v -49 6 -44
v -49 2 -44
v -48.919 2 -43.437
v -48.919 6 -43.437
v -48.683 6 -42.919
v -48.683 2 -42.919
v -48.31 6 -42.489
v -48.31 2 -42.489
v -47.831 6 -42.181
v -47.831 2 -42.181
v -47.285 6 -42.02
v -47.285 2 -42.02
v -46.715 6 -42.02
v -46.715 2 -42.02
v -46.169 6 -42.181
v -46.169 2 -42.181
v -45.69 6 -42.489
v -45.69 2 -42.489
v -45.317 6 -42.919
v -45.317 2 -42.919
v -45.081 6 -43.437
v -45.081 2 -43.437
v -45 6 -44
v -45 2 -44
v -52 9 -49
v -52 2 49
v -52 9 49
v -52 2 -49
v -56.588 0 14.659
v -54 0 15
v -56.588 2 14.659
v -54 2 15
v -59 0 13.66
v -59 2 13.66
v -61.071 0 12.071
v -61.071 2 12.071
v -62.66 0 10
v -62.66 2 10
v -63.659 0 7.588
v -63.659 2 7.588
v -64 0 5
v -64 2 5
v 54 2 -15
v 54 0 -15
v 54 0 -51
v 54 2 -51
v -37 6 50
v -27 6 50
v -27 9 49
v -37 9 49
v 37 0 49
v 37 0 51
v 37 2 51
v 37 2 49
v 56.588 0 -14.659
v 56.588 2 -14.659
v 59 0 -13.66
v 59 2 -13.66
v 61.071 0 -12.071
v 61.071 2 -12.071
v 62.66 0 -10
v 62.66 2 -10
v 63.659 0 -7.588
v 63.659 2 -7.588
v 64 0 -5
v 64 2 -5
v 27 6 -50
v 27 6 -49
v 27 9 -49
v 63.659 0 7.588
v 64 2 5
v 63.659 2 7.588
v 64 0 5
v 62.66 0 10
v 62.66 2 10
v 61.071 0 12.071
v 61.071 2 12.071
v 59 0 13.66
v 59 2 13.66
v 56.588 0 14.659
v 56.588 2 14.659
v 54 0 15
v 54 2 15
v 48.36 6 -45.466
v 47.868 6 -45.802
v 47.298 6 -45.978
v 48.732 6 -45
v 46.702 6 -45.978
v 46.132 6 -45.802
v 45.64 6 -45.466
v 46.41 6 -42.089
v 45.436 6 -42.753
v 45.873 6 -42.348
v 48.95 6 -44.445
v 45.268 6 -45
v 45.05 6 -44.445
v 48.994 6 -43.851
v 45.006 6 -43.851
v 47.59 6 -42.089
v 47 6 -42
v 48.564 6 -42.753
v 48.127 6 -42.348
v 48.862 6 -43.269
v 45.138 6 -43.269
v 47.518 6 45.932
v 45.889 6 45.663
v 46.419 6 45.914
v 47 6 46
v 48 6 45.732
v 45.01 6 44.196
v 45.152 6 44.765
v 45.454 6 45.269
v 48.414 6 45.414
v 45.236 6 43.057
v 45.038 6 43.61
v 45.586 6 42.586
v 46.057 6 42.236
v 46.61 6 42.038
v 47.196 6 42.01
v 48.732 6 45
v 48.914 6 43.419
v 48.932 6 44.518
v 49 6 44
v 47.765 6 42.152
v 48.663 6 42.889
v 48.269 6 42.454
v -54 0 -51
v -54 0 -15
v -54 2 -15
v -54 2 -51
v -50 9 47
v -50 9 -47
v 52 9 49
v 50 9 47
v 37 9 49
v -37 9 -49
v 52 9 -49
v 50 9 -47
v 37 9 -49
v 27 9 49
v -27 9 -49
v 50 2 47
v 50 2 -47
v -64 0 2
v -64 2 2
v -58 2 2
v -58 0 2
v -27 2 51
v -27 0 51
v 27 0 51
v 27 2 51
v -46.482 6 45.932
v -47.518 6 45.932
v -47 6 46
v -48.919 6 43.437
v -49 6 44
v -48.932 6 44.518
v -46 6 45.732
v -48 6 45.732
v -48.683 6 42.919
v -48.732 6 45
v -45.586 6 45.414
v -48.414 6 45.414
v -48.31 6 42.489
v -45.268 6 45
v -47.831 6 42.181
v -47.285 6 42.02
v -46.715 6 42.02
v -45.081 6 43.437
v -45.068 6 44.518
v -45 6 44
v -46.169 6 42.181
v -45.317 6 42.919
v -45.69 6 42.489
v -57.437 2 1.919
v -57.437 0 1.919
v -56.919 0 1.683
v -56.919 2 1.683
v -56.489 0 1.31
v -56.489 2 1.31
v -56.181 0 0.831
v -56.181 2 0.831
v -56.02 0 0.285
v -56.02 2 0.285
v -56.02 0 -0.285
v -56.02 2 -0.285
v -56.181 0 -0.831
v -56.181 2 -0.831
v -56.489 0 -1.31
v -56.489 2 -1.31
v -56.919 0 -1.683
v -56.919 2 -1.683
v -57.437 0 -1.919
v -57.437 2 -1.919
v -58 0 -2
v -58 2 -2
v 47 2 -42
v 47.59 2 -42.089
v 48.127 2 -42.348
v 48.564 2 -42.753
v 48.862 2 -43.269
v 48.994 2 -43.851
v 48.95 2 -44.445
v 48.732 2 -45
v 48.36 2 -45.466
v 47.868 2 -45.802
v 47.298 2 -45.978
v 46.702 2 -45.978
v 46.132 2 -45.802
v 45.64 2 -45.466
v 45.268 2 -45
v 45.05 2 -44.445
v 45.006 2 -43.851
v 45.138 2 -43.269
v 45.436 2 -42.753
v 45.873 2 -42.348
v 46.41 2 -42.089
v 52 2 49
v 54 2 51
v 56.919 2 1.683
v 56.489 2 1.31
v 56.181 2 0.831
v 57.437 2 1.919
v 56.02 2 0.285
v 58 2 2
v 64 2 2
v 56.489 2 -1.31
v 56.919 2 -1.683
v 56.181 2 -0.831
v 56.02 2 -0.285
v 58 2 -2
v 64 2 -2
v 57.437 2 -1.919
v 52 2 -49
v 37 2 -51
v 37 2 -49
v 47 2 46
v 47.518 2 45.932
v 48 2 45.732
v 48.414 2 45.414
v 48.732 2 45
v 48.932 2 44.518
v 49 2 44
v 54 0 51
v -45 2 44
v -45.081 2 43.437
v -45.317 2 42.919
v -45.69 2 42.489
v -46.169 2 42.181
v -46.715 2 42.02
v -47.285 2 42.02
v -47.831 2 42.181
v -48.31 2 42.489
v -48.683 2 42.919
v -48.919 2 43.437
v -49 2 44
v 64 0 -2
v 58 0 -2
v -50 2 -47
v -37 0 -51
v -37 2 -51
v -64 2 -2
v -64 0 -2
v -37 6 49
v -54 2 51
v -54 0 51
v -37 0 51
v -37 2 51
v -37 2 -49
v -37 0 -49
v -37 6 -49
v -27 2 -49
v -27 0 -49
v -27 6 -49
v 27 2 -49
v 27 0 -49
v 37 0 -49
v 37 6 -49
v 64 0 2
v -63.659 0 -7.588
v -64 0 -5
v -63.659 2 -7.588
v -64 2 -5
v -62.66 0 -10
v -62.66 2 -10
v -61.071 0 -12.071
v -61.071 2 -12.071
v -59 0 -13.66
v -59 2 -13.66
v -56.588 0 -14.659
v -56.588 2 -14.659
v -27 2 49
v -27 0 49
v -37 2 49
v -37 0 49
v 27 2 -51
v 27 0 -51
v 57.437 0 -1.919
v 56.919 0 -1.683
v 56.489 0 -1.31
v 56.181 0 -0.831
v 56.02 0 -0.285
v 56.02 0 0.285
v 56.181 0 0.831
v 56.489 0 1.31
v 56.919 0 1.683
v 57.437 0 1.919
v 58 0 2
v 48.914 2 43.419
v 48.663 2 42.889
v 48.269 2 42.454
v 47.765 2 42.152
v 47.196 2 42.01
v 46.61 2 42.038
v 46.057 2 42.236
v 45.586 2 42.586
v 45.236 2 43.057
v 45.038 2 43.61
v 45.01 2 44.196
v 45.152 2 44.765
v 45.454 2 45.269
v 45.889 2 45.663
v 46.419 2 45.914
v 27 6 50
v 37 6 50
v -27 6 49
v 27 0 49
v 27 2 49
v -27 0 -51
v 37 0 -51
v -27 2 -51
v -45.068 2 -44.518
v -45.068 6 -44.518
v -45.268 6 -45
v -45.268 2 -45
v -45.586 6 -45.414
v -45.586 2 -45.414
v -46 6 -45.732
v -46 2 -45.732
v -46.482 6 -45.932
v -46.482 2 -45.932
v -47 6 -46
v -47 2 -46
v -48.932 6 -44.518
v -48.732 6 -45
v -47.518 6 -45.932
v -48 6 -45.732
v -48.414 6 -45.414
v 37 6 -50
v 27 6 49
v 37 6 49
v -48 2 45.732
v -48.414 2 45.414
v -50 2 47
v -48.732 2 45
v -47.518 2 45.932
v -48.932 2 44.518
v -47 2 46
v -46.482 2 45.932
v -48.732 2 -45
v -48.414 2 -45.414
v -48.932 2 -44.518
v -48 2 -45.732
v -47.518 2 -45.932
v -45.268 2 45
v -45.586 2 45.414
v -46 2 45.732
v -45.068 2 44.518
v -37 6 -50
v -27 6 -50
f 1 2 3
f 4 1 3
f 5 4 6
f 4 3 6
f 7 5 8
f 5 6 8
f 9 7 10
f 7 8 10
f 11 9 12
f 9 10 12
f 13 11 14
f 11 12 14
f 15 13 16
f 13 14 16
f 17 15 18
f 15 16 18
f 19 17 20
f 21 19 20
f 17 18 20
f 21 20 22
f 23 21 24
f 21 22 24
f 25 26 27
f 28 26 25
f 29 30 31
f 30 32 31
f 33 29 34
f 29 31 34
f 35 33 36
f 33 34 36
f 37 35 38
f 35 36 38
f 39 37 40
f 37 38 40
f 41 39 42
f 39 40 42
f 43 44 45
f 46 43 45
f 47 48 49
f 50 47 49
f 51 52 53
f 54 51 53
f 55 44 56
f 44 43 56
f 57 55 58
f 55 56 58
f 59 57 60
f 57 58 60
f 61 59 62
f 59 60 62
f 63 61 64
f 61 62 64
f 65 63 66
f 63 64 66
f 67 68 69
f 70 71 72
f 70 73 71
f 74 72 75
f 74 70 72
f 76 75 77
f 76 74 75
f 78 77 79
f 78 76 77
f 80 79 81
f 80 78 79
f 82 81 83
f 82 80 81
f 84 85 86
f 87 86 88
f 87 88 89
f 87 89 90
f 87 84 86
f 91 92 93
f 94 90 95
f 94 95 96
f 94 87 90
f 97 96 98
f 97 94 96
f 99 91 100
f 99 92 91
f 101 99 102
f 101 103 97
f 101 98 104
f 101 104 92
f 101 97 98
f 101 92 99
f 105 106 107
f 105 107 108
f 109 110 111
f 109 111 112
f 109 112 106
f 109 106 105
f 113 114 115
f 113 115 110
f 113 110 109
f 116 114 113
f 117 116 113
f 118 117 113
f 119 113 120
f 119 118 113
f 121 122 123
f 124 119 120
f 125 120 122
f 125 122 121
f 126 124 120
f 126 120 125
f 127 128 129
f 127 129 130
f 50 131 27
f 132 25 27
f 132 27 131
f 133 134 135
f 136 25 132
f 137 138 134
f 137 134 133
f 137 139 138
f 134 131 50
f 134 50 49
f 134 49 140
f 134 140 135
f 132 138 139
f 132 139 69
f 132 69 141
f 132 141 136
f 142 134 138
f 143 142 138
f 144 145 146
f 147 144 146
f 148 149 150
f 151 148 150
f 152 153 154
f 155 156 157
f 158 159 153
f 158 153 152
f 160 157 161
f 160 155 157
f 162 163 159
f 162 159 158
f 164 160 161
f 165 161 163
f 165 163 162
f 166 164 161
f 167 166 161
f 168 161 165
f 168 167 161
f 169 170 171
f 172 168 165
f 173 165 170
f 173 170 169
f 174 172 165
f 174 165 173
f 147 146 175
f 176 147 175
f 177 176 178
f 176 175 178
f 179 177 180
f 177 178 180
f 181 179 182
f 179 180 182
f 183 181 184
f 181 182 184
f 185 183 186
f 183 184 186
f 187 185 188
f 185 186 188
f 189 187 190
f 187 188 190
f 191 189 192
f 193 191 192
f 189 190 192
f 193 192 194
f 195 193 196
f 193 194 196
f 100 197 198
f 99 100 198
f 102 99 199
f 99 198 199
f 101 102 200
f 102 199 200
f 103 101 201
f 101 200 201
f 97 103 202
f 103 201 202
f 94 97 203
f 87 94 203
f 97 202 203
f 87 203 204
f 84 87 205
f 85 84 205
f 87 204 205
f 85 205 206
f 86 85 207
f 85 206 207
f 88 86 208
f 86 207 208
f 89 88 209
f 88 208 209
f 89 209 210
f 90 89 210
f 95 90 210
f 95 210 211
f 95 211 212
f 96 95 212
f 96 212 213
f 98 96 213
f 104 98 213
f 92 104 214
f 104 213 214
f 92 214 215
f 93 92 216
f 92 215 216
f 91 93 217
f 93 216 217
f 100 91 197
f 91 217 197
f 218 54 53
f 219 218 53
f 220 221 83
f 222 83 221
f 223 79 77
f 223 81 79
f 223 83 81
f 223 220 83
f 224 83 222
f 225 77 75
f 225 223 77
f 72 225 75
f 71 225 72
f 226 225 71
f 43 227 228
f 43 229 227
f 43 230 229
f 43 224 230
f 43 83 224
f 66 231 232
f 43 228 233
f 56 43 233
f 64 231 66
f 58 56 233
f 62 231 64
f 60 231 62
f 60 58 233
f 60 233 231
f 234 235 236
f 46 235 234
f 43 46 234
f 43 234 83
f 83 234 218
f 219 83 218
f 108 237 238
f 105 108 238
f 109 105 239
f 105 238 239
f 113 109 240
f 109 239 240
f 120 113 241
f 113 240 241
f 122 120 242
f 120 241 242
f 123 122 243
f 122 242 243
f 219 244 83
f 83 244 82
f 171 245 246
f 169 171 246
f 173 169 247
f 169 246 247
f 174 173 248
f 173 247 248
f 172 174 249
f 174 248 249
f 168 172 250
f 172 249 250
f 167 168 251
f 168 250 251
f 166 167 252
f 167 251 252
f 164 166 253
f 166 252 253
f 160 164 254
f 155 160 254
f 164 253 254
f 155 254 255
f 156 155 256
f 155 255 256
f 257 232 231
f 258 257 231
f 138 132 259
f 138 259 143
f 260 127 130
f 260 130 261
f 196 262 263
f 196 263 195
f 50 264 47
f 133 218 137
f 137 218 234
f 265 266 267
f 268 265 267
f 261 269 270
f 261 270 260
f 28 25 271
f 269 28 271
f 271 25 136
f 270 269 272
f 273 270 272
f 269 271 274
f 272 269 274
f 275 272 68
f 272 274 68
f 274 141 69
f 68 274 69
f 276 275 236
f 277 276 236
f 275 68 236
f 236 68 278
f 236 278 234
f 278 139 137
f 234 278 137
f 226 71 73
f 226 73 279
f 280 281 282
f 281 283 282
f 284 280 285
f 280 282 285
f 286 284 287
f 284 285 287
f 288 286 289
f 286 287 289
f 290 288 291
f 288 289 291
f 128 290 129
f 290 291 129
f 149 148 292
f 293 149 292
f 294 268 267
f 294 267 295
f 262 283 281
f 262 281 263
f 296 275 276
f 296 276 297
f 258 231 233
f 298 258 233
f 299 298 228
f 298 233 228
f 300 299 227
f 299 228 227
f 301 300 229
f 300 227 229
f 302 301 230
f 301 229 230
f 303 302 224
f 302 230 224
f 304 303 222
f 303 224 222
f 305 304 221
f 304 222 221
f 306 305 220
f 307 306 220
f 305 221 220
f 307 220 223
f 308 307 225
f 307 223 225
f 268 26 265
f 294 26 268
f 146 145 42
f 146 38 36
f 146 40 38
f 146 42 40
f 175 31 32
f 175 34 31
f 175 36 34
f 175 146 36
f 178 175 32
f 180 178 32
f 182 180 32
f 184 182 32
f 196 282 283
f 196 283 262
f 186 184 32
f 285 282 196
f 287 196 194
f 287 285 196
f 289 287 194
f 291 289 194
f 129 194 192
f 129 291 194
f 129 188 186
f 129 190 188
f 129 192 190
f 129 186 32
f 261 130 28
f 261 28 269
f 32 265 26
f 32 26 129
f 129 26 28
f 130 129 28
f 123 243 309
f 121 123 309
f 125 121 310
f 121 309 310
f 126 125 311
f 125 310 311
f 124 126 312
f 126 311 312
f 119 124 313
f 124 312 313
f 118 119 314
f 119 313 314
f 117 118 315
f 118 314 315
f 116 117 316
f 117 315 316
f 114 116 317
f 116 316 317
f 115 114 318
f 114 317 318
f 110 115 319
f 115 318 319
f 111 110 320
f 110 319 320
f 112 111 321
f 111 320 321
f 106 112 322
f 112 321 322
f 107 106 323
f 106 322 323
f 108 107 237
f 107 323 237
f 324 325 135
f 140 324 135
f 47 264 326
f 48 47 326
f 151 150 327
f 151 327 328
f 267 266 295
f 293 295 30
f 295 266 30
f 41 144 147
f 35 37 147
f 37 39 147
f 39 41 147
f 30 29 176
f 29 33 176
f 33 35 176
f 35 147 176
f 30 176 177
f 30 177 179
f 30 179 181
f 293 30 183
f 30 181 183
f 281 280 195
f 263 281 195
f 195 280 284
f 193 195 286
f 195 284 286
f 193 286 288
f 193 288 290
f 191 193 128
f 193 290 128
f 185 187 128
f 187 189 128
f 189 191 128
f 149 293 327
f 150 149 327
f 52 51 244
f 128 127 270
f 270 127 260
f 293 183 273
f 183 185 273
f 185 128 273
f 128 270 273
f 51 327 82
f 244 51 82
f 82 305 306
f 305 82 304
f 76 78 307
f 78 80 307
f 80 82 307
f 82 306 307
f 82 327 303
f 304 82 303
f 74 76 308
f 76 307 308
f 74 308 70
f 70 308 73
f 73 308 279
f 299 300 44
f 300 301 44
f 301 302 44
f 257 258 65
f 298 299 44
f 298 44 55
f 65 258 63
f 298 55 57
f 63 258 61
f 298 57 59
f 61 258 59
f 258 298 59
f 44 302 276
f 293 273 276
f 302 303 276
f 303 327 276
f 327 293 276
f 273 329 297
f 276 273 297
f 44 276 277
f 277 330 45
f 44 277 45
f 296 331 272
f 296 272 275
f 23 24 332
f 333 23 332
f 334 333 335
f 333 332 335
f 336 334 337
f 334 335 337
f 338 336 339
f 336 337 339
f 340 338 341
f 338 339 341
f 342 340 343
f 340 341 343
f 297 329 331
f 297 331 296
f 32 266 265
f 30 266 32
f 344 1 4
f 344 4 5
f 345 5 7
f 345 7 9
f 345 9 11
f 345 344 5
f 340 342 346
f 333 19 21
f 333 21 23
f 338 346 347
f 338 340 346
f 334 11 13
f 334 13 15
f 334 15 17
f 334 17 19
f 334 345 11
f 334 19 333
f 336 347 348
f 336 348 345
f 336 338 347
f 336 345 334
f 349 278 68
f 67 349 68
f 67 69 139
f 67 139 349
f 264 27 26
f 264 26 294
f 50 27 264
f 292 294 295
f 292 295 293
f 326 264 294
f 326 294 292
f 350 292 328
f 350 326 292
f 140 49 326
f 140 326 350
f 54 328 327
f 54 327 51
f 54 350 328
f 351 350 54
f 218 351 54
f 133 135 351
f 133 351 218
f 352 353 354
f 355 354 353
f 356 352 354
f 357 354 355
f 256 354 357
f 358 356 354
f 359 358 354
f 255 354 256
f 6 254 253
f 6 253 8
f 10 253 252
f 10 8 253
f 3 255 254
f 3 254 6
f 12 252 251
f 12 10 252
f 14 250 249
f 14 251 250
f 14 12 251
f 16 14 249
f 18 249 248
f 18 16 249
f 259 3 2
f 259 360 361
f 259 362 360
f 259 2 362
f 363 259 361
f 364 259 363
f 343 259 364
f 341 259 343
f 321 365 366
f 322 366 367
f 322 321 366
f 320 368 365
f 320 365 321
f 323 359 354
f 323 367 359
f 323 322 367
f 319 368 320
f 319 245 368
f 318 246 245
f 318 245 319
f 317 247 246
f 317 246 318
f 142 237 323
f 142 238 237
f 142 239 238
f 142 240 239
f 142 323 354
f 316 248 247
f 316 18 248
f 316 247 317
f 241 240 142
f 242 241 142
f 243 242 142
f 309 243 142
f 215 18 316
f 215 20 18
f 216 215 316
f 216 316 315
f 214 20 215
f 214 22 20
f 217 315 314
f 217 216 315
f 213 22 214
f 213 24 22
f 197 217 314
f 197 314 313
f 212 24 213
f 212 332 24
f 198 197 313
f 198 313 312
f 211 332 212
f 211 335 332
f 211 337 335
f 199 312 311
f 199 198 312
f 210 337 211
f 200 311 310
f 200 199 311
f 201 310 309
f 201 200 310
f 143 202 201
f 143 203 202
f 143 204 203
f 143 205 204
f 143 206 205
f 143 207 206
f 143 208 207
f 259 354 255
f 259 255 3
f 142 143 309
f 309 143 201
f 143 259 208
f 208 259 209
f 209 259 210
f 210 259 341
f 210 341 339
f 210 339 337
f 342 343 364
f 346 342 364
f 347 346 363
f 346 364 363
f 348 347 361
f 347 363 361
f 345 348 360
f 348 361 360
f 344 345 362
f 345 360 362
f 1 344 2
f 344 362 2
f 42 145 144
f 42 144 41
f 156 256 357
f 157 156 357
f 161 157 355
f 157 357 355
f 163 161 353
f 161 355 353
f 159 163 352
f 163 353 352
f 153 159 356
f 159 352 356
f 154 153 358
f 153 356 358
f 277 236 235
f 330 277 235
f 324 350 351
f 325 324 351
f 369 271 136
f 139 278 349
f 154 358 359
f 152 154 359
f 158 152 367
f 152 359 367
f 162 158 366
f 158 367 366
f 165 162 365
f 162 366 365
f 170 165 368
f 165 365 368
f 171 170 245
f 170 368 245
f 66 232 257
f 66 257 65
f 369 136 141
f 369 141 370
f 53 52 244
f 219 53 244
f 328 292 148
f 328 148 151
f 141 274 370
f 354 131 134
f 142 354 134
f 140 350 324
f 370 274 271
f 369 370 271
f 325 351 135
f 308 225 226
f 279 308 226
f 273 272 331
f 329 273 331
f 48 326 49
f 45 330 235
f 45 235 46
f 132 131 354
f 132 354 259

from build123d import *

# Parameters (mm, degrees)
SKETCH1_W            = 108
SKETCH1_H            = 102
BOSS_EXTRUDE1_DEPTH  = 2
SKETCH2_W            = 104
SKETCH2_H            = 98
BOSS_EXTRUDE2_DEPTH  = 7
SKETCH3_W            = 100
SKETCH3_H            = 94
CUT_EXTRUDE1_DEPTH   = 7
SKETCH4_W            = 10
SKETCH4_H            = 3
BOSS_EXTRUDE6_DEPTH  = 1
CUT_EXTRUDE2_DEPTH   = 10
SKETCH6_W            = 10
SKETCH6_H            = 3
BOSS_EXTRUDE7_DEPTH  = 1
CUT_EXTRUDE3_DEPTH   = 10
SKETCH9_W            = 10
SKETCH9_H            = 3
BOSS_EXTRUDE9_DEPTH  = 1
CUT_EXTRUDE4_DEPTH   = 10
SKETCH11_W           = 10
SKETCH11_H           = 3
BOSS_EXTRUDE10_DEPTH = 1
CUT_EXTRUDE5_DEPTH   = 10
SKETCH20_W           = 10
SKETCH20_H           = 2
CUT_EXTRUDE7_DEPTH   = 2
SKETCH21_W           = 10
SKETCH21_H           = 2
CUT_EXTRUDE8_DEPTH   = 2
SKETCH22_W           = 10
SKETCH22_H           = 2
CUT_EXTRUDE9_DEPTH   = 2
SKETCH23_W           = 10
SKETCH23_H           = 2
CUT_EXTRUDE11_DEPTH  = 2
SKETCH24_R           = 2
BOSS_EXTRUDE11_DEPTH = 4
BOSS_EXTRUDE12_DEPTH = 4
BOSS_EXTRUDE13_DEPTH = 4
BOSS_EXTRUDE14_DEPTH = 4
SKETCH28_W           = 30
SKETCH28_H           = 2
BOSS_EXTRUDE15_DEPTH = 10
SKETCH29_R           = 2
SKETCH29_W           = 6
SKETCH29_H           = 4
CUT_EXTRUDE12_DEPTH  = 2
FILLET1_R            = 10
SKETCH30_W           = 30
SKETCH30_H           = 1
BOSS_EXTRUDE16_DEPTH = 10
CUT_EXTRUDE13_DEPTH  = 2
FILLET2_R            = 10


with BuildPart() as part:
    # Sketch1 → Boss-Extrude1 (new body)
    with BuildSketch(Plane(origin=(0, 0, 0), x_dir=(1, 0, 0), z_dir=(0, 1, 0))):
        Rectangle(SKETCH1_W, SKETCH1_H)
    extrude(amount=BOSS_EXTRUDE1_DEPTH)

    # Sketch2 → Boss-Extrude2 (add)
    with BuildSketch(Plane(origin=(0, 2, 0), x_dir=(1, 0, 0), z_dir=(0, 1, 0))):
        Rectangle(SKETCH2_W, SKETCH2_H)
    extrude(amount=BOSS_EXTRUDE2_DEPTH)

    # Sketch3 → Cut-Extrude1 (cut)
    with BuildSketch(Plane(origin=(0, 9, 0), x_dir=(1, 0, 0), z_dir=(0, 1, 0))):
        Rectangle(SKETCH3_W, SKETCH3_H)
    extrude(amount=-CUT_EXTRUDE1_DEPTH, mode=Mode.SUBTRACT)

    # Sketch4 → Boss-Extrude6 (add)
    with BuildSketch(Plane.XY.offset(49)):
        with Locations((-32, 7.5)):
            Rectangle(SKETCH4_W, SKETCH4_H)
    extrude(amount=BOSS_EXTRUDE6_DEPTH)

    # Sketch5 → Cut-Extrude2 (cut)
    with BuildSketch(Plane(origin=(-27, 0, 0), x_dir=(0, 0, -1), z_dir=(1, 0, 0))):
        Polygon((-50, 6), (-49, 9), (-50, 9), align=None)
    extrude(amount=-CUT_EXTRUDE2_DEPTH, mode=Mode.SUBTRACT)

    # Sketch6 → Boss-Extrude7 (add)
    with BuildSketch(Plane.XY.offset(49)):
        with Locations((32, 7.5)):
            Rectangle(SKETCH6_W, SKETCH6_H)
    extrude(amount=BOSS_EXTRUDE7_DEPTH)

    # Sketch7 → Cut-Extrude3 (cut)
    with BuildSketch(Plane(origin=(37, 0, 0), x_dir=(0, 0, -1), z_dir=(1, 0, 0))):
        Polygon((-50, 6), (-49, 9), (-50, 9), align=None)
    extrude(amount=-CUT_EXTRUDE3_DEPTH, mode=Mode.SUBTRACT)

    # Sketch9 → Boss-Extrude9 (add)
    with BuildSketch(Plane(origin=(0, 0, -49), x_dir=(-1, 0, 0), z_dir=(0, 0, -1))):
        with Locations((-32, 7.5)):
            Rectangle(SKETCH9_W, SKETCH9_H)
    extrude(amount=BOSS_EXTRUDE9_DEPTH)

    # Sketch10 → Cut-Extrude4 (cut)
    with BuildSketch(Plane.ZY.offset(-27)):
        Polygon((-49, 9), (-50, 6), (-50, 9), align=None)
    extrude(amount=-CUT_EXTRUDE4_DEPTH, mode=Mode.SUBTRACT)

    # Sketch11 → Boss-Extrude10 (add)
    with BuildSketch(Plane(origin=(0, 0, -49), x_dir=(-1, 0, 0), z_dir=(0, 0, -1))):
        with Locations((32, 7.5)):
            Rectangle(SKETCH11_W, SKETCH11_H)
    extrude(amount=BOSS_EXTRUDE10_DEPTH)

    # Sketch12 → Cut-Extrude5 (cut)
    with BuildSketch(Plane.ZY.offset(37)):
        Polygon((-49, 9), (-50, 6), (-50, 9), align=None)
    extrude(amount=-CUT_EXTRUDE5_DEPTH, mode=Mode.SUBTRACT)

    # Sketch20 → Cut-Extrude7 (cut)
    with BuildSketch(Plane.XY.offset(51)):
        with Locations((32, 1)):
            Rectangle(SKETCH20_W, SKETCH20_H)
    extrude(amount=-CUT_EXTRUDE7_DEPTH, mode=Mode.SUBTRACT)

    # Sketch21 → Cut-Extrude8 (cut)
    with BuildSketch(Plane(origin=(0, 2, 0), x_dir=(1, 0, 0), z_dir=(0, 1, 0))):
        with Locations((-32, -50)):
            Rectangle(SKETCH21_W, SKETCH21_H)
    extrude(amount=-CUT_EXTRUDE8_DEPTH, mode=Mode.SUBTRACT)

    # Sketch22 → Cut-Extrude9 (cut)
    with BuildSketch(Plane(origin=(0, 2, 0), x_dir=(1, 0, 0), z_dir=(0, 1, 0))):
        with Locations((32, 50)):
            Rectangle(SKETCH22_W, SKETCH22_H)
    extrude(amount=-CUT_EXTRUDE9_DEPTH, mode=Mode.SUBTRACT)

    # Sketch23 → Cut-Extrude11 (cut)
    with BuildSketch(Plane(origin=(0, 2, 0), x_dir=(1, 0, 0), z_dir=(0, 1, 0))):
        with Locations((-32, 50)):
            Rectangle(SKETCH23_W, SKETCH23_H)
    extrude(amount=-CUT_EXTRUDE11_DEPTH, mode=Mode.SUBTRACT)

    # Sketch24 → Boss-Extrude11 (add)
    with BuildSketch(Plane(origin=(0, 2, 0), x_dir=(1, 0, 0), z_dir=(0, 1, 0))):
        with Locations(Location((47, 44, 0), (0, 0, 270))):
            Circle(SKETCH24_R)
    extrude(amount=BOSS_EXTRUDE11_DEPTH)

    # Sketch25 → Boss-Extrude12 (add)
    with BuildSketch(Plane(origin=(0, 2, 0), x_dir=(1, 0, 0), z_dir=(0, 1, 0))):
        with BuildLine():
            ThreePointArc((-45, 44), (-45.585786438, 45.414213562), (-47, 46))
            Line((-47, 46), (-47, 44))
            Line((-47, 44), (-49, 44))
            ThreePointArc((-49, 44), (-47, 42), (-45, 44))
        make_face()
        with BuildLine():
            Line((-47, 44), (-47, 46))
            ThreePointArc((-47, 46), (-48.414213562, 45.414213562), (-49, 44))
            Line((-49, 44), (-47, 44))
        make_face()
    extrude(amount=BOSS_EXTRUDE12_DEPTH)

    # Sketch26 → Boss-Extrude13 (add)
    with BuildSketch(Plane(origin=(0, 2, 0), x_dir=(1, 0, 0), z_dir=(0, 1, 0))):
        with BuildLine():
            ThreePointArc((-49, -44), (-48.414213562, -45.414213562), (-47, -46))
            Line((-47, -46), (-47, -44))
            Line((-47, -44), (-49, -44))
        make_face()
        with BuildLine():
            Line((-47, -44), (-47, -46))
            ThreePointArc((-47, -46), (-45.585786438, -45.414213562), (-45, -44))
            ThreePointArc((-45, -44), (-47, -42), (-49, -44))
            Line((-49, -44), (-47, -44))
        make_face()
    extrude(amount=BOSS_EXTRUDE13_DEPTH)

    # Sketch27 → Boss-Extrude14 (add)
    with BuildSketch(Plane(origin=(0, 2, 0), x_dir=(1, 0, 0), z_dir=(0, 1, 0))):
        with BuildLine():
            ThreePointArc((49, -44), (45.585786438, -42.585786438), (47, -46))
            Line((47, -46), (47, -44))
            Line((47, -44), (49, -44))
        make_face()
        with BuildLine():
            Line((47, -44), (47, -46))
            ThreePointArc((47, -46), (48.414213562, -45.414213562), (49, -44))
            Line((49, -44), (47, -44))
        make_face()
    extrude(amount=BOSS_EXTRUDE14_DEPTH)

    # Sketch28 → Boss-Extrude15 (add)
    with BuildSketch(Plane.ZY.offset(54)):
        with Locations((0, 1)):
            Rectangle(SKETCH28_W, SKETCH28_H)
    extrude(amount=BOSS_EXTRUDE15_DEPTH)

    # Sketch29 → Cut-Extrude12 (cut)
    with BuildSketch(Plane(origin=(0, 2, 0), x_dir=(1, 0, 0), z_dir=(0, 1, 0))):
        with Locations((-58, 0)):
            Circle(SKETCH29_R)
        with Locations((-61, 0)):
            Rectangle(SKETCH29_W, SKETCH29_H)
    extrude(amount=-CUT_EXTRUDE12_DEPTH, mode=Mode.SUBTRACT)

    # Fillet1
    fillet1_edges = [part.edges().sort_by_distance(p)[0] for p in [
        (-64, 1, 15),
        (-64, 1, -15),
    ]]
    fillet(fillet1_edges, radius=FILLET1_R - 0.0001)  # a hair under: the kernel refuses the full size

    # Sketch30 → Boss-Extrude16 (add)
    with BuildSketch(Plane(origin=(54, 0, 0), x_dir=(0, 0, -1), z_dir=(1, 0, 0))):
        with Locations((0, 1.5)):
            Rectangle(SKETCH30_W, SKETCH30_H)
        with Locations((0, 0.5)):
            Rectangle(SKETCH30_W, SKETCH30_H)
    extrude(amount=BOSS_EXTRUDE16_DEPTH)

    # Sketch32 → Cut-Extrude13 (cut)
    with BuildSketch(Plane(origin=(0, 2, 0), x_dir=(1, 0, 0), z_dir=(0, 1, 0))):
        with BuildLine():
            Line((58, -2), (64, -2))
            Line((64, -2), (64, 2))
            Line((64, 2), (58, 2))
            ThreePointArc((58, 2), (59.414213562, 1.414213562), (60, 0))
            ThreePointArc((60, 0), (59.414213562, -1.414213562), (58, -2))
        make_face()
        with BuildLine():
            ThreePointArc((58, 2), (56, 0), (58, -2))
            Line((58, -2), (58, 2))
        make_face()
        with BuildLine():
            Line((58, 2), (58, -2))
            ThreePointArc((58, -2), (59.414213562, -1.414213562), (60, 0))
            ThreePointArc((60, 0), (59.414213562, 1.414213562), (58, 2))
        make_face()
    extrude(amount=-CUT_EXTRUDE13_DEPTH, mode=Mode.SUBTRACT)

    # Fillet2
    fillet2_edges = [part.edges().sort_by_distance(p)[0] for p in [
        (64, 1, -15),
        (64, 1, 15),
    ]]
    fillet(fillet2_edges, radius=FILLET2_R - 0.0001)  # a hair under: the kernel refuses the full size


solid = part.part
